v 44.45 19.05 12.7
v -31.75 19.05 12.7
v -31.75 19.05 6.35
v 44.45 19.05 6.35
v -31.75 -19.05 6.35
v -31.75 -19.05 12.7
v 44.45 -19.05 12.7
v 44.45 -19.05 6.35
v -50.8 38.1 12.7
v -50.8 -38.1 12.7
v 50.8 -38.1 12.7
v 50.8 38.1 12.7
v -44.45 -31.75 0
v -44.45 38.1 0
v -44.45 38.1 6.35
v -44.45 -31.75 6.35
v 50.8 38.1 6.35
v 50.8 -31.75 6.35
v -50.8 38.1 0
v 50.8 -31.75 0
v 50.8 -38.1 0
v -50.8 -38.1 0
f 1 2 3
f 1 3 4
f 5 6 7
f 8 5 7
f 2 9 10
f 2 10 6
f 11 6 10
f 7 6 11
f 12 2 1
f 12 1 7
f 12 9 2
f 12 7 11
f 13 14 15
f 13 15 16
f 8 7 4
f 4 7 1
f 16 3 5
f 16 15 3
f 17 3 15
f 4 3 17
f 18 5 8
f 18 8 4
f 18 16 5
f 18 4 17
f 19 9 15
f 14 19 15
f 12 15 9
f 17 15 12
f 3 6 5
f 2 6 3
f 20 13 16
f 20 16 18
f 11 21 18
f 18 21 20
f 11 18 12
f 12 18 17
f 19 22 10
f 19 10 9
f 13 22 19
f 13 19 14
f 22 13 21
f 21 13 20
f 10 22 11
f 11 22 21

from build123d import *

# Parameters (mm, degrees)
F0_W     = 101.6
F0_H     = 76.2
F1_DEPTH = 12.7
F2_W     = 95.25
F2_H     = 69.85
F3_DEPTH = 6.35
F4_W     = 76.2
F4_H     = 38.1
F5_DEPTH = 25.4


with BuildPart() as f1:
    # F0 (on Top) → F1 (new body)
    with BuildSketch(Plane.XY):
        Rectangle(F0_W, F0_H)
    extrude(amount=F1_DEPTH)

    # F2 (on face) → F3 (cut)
    with BuildSketch(Plane(origin=(0, 0, 0), x_dir=(1, 0, 0), z_dir=(0, 0, -1))):
        with Locations((3.175, -3.175)):
            Rectangle(F2_W, F2_H)
    extrude(amount=-F3_DEPTH, mode=Mode.SUBTRACT)

    # F4 (on face) → F5 (cut)
    with BuildSketch(Plane.XY.offset(12.7)):
        with Locations((6.35, 0)):
            Rectangle(F4_W, F4_H)
    extrude(amount=-F5_DEPTH, mode=Mode.SUBTRACT)


solid = f1.part
